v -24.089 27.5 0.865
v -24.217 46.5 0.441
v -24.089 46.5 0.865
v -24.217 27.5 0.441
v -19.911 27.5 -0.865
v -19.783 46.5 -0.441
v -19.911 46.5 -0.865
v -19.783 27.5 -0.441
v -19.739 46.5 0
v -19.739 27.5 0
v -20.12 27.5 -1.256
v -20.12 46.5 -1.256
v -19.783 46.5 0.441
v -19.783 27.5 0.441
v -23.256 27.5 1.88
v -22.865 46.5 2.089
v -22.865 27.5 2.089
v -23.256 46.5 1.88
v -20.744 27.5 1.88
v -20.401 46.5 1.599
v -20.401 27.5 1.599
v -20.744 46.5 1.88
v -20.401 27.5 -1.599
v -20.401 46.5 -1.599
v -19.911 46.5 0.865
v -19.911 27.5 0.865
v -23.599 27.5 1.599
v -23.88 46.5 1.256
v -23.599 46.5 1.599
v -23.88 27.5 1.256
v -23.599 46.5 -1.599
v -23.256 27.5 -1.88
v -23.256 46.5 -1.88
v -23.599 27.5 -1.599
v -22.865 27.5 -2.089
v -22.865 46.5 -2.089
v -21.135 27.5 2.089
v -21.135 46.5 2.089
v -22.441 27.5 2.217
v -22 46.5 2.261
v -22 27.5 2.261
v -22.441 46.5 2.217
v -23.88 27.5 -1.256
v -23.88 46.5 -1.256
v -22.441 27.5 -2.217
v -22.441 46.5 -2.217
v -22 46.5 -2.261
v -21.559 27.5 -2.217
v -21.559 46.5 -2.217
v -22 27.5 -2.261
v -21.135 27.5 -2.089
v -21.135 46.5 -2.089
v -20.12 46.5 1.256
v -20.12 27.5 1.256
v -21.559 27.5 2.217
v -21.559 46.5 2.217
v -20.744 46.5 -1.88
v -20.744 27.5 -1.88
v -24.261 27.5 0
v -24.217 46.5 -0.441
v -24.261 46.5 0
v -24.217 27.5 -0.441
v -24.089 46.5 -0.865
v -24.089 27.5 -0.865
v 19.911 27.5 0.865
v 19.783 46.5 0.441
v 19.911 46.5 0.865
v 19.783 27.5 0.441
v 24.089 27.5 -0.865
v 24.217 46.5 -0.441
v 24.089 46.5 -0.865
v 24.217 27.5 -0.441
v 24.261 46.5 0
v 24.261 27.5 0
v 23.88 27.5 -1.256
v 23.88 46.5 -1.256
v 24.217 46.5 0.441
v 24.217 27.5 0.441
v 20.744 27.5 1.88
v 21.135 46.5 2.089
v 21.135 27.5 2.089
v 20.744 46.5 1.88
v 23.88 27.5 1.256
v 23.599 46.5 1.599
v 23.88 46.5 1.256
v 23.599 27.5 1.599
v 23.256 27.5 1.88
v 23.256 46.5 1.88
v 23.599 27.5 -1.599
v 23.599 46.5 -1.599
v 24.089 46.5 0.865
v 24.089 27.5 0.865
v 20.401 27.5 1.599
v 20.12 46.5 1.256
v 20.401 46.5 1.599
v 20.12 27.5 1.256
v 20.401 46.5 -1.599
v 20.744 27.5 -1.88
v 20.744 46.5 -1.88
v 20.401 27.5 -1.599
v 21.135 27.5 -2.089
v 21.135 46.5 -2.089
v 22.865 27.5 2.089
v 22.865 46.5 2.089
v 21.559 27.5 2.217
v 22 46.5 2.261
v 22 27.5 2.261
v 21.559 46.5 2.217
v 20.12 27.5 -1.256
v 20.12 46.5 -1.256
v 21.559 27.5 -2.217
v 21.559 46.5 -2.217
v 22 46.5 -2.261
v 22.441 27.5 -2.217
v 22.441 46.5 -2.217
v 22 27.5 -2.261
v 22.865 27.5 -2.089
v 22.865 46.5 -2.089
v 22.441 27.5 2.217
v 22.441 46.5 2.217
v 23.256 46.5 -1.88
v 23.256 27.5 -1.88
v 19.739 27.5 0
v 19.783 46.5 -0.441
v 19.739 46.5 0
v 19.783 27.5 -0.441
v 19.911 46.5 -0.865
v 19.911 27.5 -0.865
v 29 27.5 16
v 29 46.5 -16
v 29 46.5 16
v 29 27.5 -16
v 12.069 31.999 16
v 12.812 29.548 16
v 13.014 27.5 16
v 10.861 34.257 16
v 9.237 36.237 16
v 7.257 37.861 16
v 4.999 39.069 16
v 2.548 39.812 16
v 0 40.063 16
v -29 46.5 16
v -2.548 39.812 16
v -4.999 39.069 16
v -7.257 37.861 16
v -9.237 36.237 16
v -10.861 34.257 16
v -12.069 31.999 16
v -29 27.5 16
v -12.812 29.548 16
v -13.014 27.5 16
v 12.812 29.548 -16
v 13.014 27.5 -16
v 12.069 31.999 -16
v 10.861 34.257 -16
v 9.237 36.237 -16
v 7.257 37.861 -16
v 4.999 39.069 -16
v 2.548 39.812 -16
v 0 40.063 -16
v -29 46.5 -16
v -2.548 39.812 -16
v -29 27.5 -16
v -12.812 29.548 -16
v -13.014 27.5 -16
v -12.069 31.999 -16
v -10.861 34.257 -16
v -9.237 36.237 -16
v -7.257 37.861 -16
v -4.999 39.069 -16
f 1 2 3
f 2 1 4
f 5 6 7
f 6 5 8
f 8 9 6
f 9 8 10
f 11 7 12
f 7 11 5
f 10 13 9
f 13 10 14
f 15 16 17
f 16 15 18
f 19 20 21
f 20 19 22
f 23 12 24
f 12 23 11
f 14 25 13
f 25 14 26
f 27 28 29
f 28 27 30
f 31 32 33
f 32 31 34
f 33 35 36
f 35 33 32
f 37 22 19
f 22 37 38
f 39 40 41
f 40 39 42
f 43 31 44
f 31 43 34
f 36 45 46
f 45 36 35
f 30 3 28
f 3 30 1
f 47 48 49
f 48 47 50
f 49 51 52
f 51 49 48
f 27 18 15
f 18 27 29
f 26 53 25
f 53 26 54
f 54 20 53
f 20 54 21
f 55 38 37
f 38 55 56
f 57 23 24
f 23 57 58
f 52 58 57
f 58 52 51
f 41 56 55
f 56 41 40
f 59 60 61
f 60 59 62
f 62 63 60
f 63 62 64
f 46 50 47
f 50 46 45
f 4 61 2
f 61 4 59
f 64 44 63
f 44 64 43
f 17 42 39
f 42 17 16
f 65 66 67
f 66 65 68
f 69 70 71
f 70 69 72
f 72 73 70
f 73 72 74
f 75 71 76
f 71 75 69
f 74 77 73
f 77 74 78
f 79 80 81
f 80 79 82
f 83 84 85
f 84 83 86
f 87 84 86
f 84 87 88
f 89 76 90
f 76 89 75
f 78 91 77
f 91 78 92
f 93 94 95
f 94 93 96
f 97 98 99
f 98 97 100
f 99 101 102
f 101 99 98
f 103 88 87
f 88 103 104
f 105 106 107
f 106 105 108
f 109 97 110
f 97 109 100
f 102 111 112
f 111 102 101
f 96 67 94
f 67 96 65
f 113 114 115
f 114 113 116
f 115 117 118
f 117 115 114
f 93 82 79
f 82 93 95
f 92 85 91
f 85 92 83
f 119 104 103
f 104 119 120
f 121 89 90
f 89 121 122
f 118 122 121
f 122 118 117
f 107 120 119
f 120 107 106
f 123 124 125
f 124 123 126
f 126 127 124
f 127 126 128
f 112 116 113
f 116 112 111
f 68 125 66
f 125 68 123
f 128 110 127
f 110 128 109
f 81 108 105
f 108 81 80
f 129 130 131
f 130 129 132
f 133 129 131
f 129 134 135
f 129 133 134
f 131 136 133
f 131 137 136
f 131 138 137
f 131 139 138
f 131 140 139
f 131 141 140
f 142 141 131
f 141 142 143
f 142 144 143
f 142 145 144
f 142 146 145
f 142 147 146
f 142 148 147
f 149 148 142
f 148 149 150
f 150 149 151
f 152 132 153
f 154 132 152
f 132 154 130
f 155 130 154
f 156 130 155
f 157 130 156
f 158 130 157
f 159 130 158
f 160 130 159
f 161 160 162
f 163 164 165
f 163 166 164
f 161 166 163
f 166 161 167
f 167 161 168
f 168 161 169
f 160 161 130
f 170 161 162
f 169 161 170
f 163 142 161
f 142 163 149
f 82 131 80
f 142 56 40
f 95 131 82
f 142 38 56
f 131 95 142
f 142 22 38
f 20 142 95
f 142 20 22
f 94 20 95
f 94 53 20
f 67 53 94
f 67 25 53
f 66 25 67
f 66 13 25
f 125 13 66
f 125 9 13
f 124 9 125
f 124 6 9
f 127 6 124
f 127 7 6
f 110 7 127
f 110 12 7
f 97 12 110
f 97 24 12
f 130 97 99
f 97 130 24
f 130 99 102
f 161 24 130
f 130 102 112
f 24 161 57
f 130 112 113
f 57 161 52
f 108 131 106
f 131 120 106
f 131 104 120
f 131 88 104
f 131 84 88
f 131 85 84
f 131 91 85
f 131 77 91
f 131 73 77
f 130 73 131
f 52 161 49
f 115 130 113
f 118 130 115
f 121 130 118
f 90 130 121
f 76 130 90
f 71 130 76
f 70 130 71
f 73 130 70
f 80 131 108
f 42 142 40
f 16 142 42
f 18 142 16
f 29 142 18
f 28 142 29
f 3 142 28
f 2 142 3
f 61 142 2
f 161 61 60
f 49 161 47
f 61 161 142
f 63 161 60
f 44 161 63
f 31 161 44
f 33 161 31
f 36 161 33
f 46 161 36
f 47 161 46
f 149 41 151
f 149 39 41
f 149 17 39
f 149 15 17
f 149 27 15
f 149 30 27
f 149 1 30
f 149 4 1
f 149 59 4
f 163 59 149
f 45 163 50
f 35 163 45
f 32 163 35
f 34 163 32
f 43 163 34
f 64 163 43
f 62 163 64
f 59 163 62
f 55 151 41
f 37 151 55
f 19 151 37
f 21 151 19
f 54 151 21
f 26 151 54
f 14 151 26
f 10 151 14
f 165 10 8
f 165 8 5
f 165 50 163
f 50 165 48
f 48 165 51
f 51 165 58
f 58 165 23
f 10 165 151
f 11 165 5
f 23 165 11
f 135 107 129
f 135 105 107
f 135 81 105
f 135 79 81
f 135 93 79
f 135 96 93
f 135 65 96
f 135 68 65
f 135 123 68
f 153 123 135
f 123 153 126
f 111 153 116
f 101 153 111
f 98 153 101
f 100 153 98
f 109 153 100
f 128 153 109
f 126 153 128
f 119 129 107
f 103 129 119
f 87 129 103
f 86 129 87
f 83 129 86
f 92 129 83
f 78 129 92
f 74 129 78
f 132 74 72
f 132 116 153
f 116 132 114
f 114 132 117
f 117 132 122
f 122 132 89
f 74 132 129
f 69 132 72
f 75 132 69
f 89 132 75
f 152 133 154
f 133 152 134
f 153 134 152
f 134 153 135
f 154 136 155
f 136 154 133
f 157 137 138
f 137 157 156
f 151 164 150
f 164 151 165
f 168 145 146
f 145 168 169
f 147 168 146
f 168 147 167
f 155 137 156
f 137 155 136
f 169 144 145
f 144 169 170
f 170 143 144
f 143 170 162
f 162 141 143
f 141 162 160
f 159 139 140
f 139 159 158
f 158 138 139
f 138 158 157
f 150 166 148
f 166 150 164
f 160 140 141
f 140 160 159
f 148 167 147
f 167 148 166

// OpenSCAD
// file: ../../../../../scad/lib/parent_bottom_sensors.scad
// Parent lower assembly. mm. Purchased TD04A dimensions are PROVISIONAL.
/* [Fin cartridge] */
disk_d=225;
disk_t=5;
fin_h=125;
fin_w=65;
fin_t=4;
socket_outer=46;
beam_size=32;
beam_clear=0.5;
/* [Sensor carrier] */
carrier_w=210;
carrier_h=141;
carrier_t=8;
carrier_back=-75;
camera_x=-45;
camera_z=-110;
td_x=65;
td_z=-100;
/* [TD04A clamp: measure before printing] */
td_d=26;
td_len=55;
clamp_gap=0.5;
grip_h=32;
$fn=64;
module hole(d,h){cylinder(d=d/cos(180/32),h=h,$fn=32);}
module yhole(d,h){rotate([-90,0,0])hole(d,h);}

module cartridge(){
 assert(disk_d+10<=236 && fin_h+disk_t<=250);
 difference(){
  union(){
   cylinder(d=disk_d,h=disk_t,$fn=128);
   translate([-socket_outer/2,-socket_outer/2,disk_t])cube([socket_outer,socket_outer,fin_h]);
   for(a=[0:90:270])rotate([0,0,a])translate([socket_outer/2-0.2,-fin_t/2,disk_t])cube([fin_w+0.2,fin_t,fin_h]);
   for(x=[-23,23])for(y=[-23,23])translate([x,y,disk_t])cylinder(d=12,h=12);
  }
  translate([-(beam_size+beam_clear)/2,-(beam_size+beam_clear)/2,disk_t])cube([beam_size+beam_clear,beam_size+beam_clear,fin_h+1]);
  // Access to ballast bolt heads: open corner channels, not captive inaccessible pockets.
  for(x=[-23,23])for(y=[-23,23]){
   translate([x,y,-1])hole(5.5,19);
   translate([x,y,17])hole(12,fin_h);
  }
  for(z=[29,122])translate([-socket_outer/2-1,10,z])rotate([0,90,0])hole(6.5,socket_outer+2);
  for(x=[-75,75])for(y=[-50,-25])translate([x,y,-1])hole(5.5,disk_t+2);
  // Central M8 ballast screw access, its head remains inside the beam's existing recess.
  translate([0,0,-1])hole(18,disk_t+2);
 }
}

// Native Z=0 meets underside of disk. Rear plate is also the camera/TD mounting face.
module carrier(){
 difference(){
  union(){
   translate([-carrier_w/2,carrier_back,-carrier_h])cube([carrier_w,carrier_t,carrier_h]);
   difference(){
    translate([-carrier_w/2,carrier_back,-carrier_t])cube([carrier_w,55,carrier_t]);
    translate([0,0,-carrier_t-1])cylinder(r=64,h=carrier_t+2);
   }
  }
  for(x=[-75,75])for(y=[-50,-25])translate([x,y,-carrier_t-1])hole(5.5,carrier_t+2);
  for(x=[-11,11])for(z=[-16,16])translate([camera_x+x,carrier_back-1,camera_z+z])yhole(5.5,carrier_t+2);
  for(x=[-25,25])for(z=[-23,23])translate([td_x+x,carrier_back-1,td_z+z])yhole(5.5,carrier_t+2);
  // Clamp through-bolts also pass through carrier, retaining the split clamp with real nuts.
  for(x=[-22,22])translate([td_x+x,carrier_back-1,td_z])yhole(4.5,carrier_t+2);
  // Cable lacing eyes; no cut connector required to route cable alongside the plate.
  for(z=[-25,-50])for(x=[-45,65])translate([x,carrier_back-1,z])yhole(8,carrier_t+2);
 }
}

// Local mounting face Y=0, cylinder axis Z, center Y=27. Grip height 32.
module td_clamp(cap=false){
 assert(td_d>0 && td_d<32 && td_len>=grip_h);
 difference(){
  if(!cap)union(){
   translate([-32,0,-30])cube([64,8,60]);
   translate([-29,8,-grip_h/2])cube([58,19,grip_h]);
  }else translate([-29,27+clamp_gap,-grip_h/2])cube([58,19,grip_h]);
  translate([0,27,-grip_h/2-1])hole(td_d,grip_h+2);
  for(x=[-22,22])translate([x,-1,0])yhole(4.5,50);
  if(!cap)for(x=[-25,25])for(z=[-23,23])translate([x,-1,z])yhole(5.5,10);
 }
}
// main file
// mm. Assembly coordinates and explicit bed orientation.
part="assembly"; // [assembly,print]
use <../../../../../scad/lib/parent_bottom_sensors.scad>
if(part=="print"){translate([0,0,46.5])rotate([-90,0,0])td_clamp(true);}else{td_clamp(true);}
